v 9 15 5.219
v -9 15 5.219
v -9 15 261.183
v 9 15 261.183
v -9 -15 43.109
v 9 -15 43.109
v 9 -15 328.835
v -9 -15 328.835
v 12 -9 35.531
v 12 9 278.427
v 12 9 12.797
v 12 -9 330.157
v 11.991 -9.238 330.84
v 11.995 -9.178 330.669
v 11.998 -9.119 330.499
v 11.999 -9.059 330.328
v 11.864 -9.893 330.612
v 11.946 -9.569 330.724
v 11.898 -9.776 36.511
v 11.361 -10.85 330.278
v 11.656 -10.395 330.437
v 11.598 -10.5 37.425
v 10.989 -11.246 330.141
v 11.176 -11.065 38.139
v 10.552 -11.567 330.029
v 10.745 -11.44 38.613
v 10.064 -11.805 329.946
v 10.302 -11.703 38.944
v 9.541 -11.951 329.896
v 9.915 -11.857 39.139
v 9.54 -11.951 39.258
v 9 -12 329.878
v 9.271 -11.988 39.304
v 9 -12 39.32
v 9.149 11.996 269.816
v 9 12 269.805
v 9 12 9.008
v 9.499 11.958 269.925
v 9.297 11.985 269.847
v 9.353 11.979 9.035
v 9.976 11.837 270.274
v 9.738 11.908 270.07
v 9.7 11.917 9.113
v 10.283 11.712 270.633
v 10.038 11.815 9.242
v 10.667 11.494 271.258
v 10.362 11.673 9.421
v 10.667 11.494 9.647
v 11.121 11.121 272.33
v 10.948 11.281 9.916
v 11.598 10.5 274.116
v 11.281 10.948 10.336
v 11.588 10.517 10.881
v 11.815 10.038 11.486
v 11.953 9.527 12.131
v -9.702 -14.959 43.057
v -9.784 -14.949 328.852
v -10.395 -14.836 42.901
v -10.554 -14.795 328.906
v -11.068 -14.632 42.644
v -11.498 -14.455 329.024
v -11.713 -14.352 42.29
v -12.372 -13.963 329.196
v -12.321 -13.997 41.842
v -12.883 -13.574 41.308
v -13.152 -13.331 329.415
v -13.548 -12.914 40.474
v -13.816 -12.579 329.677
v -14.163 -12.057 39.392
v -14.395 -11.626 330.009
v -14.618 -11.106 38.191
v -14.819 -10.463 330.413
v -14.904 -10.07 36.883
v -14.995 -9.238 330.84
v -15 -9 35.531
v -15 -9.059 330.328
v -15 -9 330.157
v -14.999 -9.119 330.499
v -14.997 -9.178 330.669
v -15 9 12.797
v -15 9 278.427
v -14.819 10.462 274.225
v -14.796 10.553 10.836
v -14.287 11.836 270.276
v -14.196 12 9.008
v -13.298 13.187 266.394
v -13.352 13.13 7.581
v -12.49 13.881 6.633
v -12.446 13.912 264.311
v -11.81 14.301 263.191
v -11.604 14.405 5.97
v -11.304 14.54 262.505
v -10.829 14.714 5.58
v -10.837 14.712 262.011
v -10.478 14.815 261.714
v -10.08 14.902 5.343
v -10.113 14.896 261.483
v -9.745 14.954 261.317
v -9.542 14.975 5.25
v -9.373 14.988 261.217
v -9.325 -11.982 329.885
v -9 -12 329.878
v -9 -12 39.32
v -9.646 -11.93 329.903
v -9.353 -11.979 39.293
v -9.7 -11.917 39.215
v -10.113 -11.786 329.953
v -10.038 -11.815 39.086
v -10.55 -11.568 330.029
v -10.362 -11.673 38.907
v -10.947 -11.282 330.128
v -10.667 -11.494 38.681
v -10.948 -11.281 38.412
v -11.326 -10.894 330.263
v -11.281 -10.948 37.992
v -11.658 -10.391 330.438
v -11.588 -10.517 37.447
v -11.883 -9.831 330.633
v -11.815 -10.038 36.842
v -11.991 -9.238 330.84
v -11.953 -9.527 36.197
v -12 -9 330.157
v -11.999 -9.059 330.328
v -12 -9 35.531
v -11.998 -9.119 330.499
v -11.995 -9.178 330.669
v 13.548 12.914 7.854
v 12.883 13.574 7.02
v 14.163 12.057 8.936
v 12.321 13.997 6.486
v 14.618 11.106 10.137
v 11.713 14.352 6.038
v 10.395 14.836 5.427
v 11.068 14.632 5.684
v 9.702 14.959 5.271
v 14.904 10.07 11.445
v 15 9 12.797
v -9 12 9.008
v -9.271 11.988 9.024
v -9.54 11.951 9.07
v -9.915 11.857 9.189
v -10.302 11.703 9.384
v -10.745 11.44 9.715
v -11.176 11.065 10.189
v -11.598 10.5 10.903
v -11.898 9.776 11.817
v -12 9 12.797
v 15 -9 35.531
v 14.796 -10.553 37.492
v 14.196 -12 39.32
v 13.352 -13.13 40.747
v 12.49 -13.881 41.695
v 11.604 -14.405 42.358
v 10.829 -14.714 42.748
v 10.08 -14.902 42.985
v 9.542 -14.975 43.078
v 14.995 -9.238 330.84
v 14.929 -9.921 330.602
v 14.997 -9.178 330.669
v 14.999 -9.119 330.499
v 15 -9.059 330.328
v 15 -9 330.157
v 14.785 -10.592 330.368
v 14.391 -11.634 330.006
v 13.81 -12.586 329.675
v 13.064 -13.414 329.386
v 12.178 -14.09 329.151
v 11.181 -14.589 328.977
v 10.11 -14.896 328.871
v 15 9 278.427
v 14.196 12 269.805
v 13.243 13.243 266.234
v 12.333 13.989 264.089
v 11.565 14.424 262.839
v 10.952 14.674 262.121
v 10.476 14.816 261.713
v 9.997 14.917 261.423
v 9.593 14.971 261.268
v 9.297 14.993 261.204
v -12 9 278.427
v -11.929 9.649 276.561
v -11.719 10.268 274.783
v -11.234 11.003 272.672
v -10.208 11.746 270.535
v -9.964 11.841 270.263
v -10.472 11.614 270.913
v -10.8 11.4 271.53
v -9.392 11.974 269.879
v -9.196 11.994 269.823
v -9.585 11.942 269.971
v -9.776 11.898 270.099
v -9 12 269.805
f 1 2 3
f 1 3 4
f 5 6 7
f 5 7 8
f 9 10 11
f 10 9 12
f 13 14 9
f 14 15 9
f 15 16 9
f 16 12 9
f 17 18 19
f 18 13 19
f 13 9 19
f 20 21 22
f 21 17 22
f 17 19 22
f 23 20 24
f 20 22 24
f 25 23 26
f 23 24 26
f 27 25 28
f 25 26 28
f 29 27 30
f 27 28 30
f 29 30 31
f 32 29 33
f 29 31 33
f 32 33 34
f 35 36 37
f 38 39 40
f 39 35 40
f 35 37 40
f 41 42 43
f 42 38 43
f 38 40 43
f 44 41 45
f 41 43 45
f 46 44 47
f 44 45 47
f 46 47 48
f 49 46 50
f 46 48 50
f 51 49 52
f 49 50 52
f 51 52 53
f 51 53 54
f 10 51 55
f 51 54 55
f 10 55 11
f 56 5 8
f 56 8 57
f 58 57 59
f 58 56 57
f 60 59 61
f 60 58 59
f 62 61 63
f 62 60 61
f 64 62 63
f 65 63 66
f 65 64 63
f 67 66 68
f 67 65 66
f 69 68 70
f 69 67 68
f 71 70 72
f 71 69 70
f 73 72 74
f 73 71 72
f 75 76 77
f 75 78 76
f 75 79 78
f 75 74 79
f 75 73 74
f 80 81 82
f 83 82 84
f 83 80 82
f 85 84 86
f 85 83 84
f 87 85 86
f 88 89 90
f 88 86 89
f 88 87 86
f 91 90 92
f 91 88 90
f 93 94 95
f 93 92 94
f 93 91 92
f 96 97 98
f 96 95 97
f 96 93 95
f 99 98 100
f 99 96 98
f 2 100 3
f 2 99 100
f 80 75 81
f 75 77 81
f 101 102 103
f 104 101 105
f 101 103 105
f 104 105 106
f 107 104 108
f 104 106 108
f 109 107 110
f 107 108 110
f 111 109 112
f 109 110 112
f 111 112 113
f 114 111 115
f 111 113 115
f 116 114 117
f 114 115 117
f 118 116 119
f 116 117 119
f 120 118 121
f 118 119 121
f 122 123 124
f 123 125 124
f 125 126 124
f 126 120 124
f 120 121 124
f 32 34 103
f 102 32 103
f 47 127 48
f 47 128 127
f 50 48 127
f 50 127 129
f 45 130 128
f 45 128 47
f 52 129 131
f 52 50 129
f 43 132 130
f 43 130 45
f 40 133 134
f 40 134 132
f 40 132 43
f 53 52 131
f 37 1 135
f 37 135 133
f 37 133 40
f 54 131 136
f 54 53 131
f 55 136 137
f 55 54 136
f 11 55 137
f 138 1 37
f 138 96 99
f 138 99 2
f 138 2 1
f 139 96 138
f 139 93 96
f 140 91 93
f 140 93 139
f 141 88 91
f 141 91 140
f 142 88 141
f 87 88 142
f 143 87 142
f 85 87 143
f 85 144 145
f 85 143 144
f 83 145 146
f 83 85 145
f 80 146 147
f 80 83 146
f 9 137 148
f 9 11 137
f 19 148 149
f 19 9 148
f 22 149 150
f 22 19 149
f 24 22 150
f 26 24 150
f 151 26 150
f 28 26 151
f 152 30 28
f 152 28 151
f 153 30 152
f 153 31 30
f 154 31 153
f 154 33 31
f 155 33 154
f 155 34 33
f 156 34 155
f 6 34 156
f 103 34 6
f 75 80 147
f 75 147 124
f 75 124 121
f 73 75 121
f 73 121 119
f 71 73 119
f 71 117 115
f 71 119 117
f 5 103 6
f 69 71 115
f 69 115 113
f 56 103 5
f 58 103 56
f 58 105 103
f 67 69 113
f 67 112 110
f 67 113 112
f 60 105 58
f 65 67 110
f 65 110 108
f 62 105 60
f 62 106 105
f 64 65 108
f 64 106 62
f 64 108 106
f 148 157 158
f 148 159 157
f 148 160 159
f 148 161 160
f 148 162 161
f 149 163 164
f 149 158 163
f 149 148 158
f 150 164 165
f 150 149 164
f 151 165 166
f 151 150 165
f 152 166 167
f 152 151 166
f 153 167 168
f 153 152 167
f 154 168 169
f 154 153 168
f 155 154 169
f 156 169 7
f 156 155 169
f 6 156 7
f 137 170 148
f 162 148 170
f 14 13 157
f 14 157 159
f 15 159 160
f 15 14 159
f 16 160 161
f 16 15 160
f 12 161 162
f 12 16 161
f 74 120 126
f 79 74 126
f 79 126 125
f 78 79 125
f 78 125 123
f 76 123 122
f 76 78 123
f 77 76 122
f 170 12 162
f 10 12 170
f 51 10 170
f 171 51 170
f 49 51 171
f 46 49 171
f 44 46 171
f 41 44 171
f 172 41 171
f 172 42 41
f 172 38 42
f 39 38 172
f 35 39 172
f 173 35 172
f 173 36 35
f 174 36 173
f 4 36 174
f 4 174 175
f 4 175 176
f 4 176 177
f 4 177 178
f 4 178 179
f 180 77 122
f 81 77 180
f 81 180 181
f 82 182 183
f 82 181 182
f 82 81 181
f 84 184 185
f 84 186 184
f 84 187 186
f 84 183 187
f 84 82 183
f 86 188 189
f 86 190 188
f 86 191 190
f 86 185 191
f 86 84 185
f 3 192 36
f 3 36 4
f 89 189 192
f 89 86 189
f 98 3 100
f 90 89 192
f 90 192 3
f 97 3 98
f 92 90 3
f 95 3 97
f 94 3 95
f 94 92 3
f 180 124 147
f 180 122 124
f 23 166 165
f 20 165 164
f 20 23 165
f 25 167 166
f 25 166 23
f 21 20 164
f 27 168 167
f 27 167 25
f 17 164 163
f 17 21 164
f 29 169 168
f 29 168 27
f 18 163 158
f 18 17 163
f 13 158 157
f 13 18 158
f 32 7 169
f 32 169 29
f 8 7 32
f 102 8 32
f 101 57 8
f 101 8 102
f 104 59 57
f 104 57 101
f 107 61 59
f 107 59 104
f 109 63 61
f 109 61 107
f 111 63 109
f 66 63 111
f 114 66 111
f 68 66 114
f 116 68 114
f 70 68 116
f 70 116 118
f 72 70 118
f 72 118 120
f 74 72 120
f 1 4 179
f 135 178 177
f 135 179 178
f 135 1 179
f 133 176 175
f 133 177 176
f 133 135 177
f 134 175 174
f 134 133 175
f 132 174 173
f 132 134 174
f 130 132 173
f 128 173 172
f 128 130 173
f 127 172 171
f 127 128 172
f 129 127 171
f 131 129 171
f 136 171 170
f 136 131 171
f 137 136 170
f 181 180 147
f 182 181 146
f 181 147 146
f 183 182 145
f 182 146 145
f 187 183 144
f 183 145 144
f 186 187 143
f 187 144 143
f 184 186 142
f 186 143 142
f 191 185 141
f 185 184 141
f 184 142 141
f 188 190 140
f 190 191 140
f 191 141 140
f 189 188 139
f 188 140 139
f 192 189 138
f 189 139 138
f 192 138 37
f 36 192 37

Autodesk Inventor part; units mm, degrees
ref_plane "Start Plane" through (0, 0, 5.2194) normal (0, 0, 1) x (1, 0, 0)
ref_plane "End Plane" through (0, 0, 330.8397) normal (0, 0, 1) x (1, 0, 0)
sketch "Sketch" plane through (0, 0, 0) normal (0, 0, 1) x (1, 0, 0)
  line L0 (-15, -9) -> (-15, 9)
  line L1 (-9, 15) -> (9, 15)
  line L2 (15, 9) -> (15, -9)
  line L3 (9, -15) -> (-9, -15)
  arc A0 (-15, -9) -> (-9, -15) centre (-9, -9) ccw
  arc A1 (-9, 15) -> (-15, 9) centre (-9, 9) ccw
  arc A2 (15, 9) -> (9, 15) centre (9, 9) ccw
  arc A3 (9, -15) -> (15, -9) centre (9, -9) ccw
  arc A4 (-9, 12) -> (-12, 9) centre (-9, 9) ccw
  line L4 (-9, 12) -> (9, 12)
  arc A5 (12, 9) -> (9, 12) centre (9, 9) ccw
  line L5 (12, 9) -> (12, -9)
  arc A6 (9, -12) -> (12, -9) centre (9, -9) ccw
  line L6 (9, -12) -> (-9, -12)
  arc A7 (-12, -9) -> (-9, -12) centre (-9, -9) ccw
  line L7 (-12, -9) -> (-12, 9)
  line L8 (0, 22.7397) -> (0, -22.7397) construction
  line L9 (-22.7397, 0) -> (22.7397, 0) construction
  dimension "d7" = 6
  dimension "d10" = 30
  dimension "d11" = 30
  dimension "d12" = 3
  dimension "d15" = 15
  dimension "d16" = 15
extrude "Body" add sketch "Sketch" along normal up to surface (325.6204 mm away) from surface at 5.2194
sketch "Sketch3" plane through (0, 0, 0) normal (0, 0, 1) x (1, 0, 0)
  line L0 (0, 0) -> (10, 0)
ref_plane "Work Plane3" through (0, 0, 0) normal (0, -1, 0) x (1, 0, 0)
ref_plane "Work Plane4" through (9, 478.7803, -1071.6808) normal (0, 0.9444582, 0.3286315) x (1, 0, 0)
split "Split1" plane through (9, 478.7803, -1071.6808) removes the side toward (0, 0.9444582, 0.3286315)
ref_plane "Work Plane5" through (9, -205.4654, 283.6622) normal (0, -0.7840027, -0.6207574) x (1, 0, 0)
split "Split2" plane through (9, -205.4654, 283.6622) removes the side toward (0, -0.7840027, -0.6207574)
ref_plane "Work Plane6" through (9, 4.9295, 335.7692) normal (0, -0.3286315, 0.9444582) x (1, 0, 0)
split "Split3" plane through (9, 4.9295, 335.7692) removes the side toward (0, -0.3286315, 0.9444582)
sketch "Sketch4" plane through (0, 0, 0) normal (0, -1, 0) x (1, 0, 0)
  line L0 (-2, 5.2194) -> (12, 5.2194) projected
  line L1 (-2, 330.8397) -> (12, 330.8397) projected
  dimension "d18" = 325.6204
equation "\"d7\" = G_IR"
equation "\"d10\" = G_H"
equation "\"d11\" = G_W"
equation "\"d12\" = G_T"
equation "\"d15\" = 0.5 * d10"
equation "\"d16\" = 0.5 * d11"
equation "\"d3\" = G_L"
equation "\"G_W\" = 30"
equation "\"G_H\" = 30"
equation "\"G_T\" = 3"
equation "\"G_IR\" = 6"
equation "\"G_L\" = d18"
equation "\"G_OFFSET_START\" = -5.21936"
equation "\"G_OFFSET_END\" = -19.09635"
equation "\"d13\" = -G_OFFSET_START"
equation "\"d14\" = G_OFFSET_END + B_L"
equation "\"B_L\" = 349.93607"
properties part number "DIN EN 10219-2 - 30 x 30 x 3  - 325.62" material "Steel, Mild"
